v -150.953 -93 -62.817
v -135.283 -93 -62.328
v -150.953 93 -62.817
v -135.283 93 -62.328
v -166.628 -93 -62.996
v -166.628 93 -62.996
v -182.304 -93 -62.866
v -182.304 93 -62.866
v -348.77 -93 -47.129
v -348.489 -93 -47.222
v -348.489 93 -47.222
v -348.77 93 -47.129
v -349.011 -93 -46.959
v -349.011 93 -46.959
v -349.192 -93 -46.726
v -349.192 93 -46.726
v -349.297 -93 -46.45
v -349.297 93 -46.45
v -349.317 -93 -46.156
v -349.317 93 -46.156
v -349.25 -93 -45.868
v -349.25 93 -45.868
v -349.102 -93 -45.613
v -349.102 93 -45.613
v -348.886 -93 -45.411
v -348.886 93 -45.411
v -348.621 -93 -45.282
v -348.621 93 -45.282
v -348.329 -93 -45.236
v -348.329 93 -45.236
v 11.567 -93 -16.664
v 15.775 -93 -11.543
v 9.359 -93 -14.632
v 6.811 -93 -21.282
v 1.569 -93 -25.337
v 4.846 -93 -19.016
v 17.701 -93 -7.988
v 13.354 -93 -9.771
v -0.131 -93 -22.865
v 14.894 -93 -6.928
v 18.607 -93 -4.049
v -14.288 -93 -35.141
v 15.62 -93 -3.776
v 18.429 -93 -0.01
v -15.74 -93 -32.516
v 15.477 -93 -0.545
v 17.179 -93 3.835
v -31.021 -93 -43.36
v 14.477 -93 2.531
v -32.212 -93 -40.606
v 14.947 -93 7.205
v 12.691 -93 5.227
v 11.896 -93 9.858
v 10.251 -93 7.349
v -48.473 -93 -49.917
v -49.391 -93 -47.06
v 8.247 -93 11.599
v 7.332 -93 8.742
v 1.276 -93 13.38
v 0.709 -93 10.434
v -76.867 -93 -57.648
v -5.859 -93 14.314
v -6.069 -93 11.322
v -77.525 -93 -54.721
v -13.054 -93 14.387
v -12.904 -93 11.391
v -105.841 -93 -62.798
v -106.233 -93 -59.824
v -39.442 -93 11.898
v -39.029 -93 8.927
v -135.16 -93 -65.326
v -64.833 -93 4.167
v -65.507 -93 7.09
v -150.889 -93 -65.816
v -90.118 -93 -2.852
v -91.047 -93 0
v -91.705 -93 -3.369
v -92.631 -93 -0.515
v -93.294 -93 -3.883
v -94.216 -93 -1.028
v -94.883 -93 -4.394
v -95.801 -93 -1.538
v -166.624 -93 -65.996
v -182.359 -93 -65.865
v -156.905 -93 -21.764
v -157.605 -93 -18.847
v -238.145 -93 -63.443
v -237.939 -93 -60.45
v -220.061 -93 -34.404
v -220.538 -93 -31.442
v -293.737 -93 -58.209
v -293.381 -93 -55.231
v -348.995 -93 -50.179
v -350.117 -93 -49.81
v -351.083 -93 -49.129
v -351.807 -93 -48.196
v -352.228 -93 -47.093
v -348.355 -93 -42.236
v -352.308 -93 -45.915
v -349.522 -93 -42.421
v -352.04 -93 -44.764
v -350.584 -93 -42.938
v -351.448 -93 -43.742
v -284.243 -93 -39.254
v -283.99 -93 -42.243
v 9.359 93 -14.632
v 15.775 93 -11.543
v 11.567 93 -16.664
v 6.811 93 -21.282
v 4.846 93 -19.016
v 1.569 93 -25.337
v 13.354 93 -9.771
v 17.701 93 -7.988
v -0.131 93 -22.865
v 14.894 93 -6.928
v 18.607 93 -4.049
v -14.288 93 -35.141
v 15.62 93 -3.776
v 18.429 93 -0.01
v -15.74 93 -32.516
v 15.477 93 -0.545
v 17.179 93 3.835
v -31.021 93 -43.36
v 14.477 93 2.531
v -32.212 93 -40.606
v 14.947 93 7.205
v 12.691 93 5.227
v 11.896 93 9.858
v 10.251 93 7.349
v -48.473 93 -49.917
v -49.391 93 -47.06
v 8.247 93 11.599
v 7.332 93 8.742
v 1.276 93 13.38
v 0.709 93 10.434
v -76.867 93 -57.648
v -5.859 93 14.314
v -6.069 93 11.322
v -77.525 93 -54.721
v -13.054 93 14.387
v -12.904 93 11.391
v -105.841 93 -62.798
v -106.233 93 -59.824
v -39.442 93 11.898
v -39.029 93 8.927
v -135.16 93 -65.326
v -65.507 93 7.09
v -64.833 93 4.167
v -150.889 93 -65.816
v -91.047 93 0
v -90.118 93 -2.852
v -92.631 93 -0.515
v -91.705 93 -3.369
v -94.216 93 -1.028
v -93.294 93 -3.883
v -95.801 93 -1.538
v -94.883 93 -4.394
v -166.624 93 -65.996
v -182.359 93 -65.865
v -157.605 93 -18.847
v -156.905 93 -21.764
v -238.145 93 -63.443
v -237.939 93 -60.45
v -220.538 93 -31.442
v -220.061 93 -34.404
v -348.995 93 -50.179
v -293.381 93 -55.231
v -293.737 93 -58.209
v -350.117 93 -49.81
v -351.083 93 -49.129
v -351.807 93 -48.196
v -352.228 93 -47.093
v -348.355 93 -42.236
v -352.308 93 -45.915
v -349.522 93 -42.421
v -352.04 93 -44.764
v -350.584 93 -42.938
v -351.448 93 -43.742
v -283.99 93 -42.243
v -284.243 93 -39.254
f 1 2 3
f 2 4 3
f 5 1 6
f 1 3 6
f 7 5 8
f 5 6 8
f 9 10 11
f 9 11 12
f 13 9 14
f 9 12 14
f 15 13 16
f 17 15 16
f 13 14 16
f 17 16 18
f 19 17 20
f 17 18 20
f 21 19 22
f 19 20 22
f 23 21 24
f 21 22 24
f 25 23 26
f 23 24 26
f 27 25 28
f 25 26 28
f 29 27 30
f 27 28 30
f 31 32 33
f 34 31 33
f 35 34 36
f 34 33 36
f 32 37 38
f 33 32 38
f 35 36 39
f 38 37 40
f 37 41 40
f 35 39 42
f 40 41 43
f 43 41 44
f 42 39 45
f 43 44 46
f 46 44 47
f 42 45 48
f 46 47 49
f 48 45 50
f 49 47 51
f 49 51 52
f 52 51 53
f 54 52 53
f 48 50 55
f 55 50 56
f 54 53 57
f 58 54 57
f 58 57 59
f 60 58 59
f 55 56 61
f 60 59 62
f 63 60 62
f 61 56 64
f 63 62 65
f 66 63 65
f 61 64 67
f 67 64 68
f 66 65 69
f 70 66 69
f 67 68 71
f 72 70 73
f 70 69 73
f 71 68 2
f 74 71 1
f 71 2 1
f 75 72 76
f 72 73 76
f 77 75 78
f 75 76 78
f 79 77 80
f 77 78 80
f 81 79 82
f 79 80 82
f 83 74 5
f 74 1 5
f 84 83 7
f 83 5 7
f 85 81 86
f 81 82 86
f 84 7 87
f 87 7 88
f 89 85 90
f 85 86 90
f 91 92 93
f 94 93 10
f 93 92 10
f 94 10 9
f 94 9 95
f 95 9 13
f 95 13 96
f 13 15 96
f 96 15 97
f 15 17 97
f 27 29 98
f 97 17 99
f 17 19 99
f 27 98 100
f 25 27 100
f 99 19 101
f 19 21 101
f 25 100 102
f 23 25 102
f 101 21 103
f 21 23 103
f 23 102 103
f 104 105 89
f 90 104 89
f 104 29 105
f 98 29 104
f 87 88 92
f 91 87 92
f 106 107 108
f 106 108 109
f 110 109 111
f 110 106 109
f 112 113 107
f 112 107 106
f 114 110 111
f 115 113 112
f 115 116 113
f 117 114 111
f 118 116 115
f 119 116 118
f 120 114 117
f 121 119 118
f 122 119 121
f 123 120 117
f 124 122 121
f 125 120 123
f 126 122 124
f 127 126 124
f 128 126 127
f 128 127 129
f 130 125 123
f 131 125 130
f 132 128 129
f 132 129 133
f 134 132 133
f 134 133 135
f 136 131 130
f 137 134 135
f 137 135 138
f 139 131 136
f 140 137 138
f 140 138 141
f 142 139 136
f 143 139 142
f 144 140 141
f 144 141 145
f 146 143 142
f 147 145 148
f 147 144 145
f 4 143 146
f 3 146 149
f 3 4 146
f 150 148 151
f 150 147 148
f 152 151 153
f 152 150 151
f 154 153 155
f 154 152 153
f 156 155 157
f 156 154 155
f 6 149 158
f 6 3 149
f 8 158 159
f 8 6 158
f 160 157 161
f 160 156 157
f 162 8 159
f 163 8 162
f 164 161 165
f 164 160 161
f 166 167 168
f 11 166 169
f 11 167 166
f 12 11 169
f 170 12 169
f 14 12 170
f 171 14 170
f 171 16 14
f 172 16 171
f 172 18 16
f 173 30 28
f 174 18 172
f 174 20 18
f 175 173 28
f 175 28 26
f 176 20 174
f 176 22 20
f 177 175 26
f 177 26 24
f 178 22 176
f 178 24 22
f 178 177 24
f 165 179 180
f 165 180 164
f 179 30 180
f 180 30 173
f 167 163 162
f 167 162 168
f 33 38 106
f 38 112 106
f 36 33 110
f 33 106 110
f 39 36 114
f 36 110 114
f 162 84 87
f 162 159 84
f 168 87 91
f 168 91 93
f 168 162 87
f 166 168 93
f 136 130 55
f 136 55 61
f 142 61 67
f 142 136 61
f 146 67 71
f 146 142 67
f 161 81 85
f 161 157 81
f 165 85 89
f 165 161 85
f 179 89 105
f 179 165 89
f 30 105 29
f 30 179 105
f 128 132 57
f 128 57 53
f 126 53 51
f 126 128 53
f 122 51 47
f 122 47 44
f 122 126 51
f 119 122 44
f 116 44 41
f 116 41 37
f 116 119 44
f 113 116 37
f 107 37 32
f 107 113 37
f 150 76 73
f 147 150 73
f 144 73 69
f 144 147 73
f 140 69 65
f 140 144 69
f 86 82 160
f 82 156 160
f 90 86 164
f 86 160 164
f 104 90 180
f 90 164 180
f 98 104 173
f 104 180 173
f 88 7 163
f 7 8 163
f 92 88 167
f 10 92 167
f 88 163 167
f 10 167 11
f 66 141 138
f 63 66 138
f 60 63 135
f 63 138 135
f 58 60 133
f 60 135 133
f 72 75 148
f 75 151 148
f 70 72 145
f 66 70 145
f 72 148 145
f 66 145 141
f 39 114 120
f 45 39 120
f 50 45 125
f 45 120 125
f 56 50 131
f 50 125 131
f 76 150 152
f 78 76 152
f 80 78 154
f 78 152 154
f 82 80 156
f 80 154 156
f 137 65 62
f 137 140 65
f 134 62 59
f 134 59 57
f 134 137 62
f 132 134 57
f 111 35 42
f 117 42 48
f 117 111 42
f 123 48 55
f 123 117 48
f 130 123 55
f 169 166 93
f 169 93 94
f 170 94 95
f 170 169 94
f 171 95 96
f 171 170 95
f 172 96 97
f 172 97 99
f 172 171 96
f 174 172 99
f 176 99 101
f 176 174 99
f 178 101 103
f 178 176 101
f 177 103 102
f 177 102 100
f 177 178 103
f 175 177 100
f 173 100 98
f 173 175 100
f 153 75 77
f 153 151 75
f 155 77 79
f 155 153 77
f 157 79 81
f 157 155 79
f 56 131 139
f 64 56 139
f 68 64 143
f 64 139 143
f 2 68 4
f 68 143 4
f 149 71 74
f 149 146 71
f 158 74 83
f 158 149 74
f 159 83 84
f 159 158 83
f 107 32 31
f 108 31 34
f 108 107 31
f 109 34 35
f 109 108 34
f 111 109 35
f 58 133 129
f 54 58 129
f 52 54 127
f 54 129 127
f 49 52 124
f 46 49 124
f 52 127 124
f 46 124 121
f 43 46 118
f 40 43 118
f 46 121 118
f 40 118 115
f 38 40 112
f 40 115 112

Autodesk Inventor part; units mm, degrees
ref_plane "YZ Plane" through (0, 0, 0) normal (1, 0, 0) x (0, 1, 0)
ref_plane "XZ Plane" through (0, 0, 0) normal (0, 1, 0) x (-1, 0, 0)
ref_plane "XY Plane" through (0, 0, 0) normal (0, 0, 1) x (1, 0, 0)
sketch "スケッチ1" plane through (0, 0, 0) normal (0, 1, 0) x (-1, 0, 0)
  arc A0 (182.3045, -62.8657) -> (348.4892, -47.2216) centre (162.2533, 1040.6287) ccw projected
  arc A1 (135.2834, -62.3282) -> (182.3045, -62.8657) centre (167.871, 731.467) ccw projected
  arc A2 (49.3906, -47.0603) -> (135.2834, -62.3282) centre (148.588, 261.756) ccw projected
  arc A3 (0.1309, -22.8654) -> (49.3906, -47.0603) centre (107.173, 132.825) ccw projected
  arc A4 (-13.3538, -9.7713) -> (0.1309, -22.8654) centre (31.9, 23.342) ccw projected
  arc A5 (-7.3318, 8.7424) -> (-13.3538, -9.7713) centre (-3.6695, -2.6851) ccw projected
  arc A6 (12.9042, 11.391) -> (-7.3318, 8.7424) centre (10.0641, -45.5382) ccw projected
  arc A7 (90.1175, -2.8524) -> (12.9042, 11.391) centre (-1.8944, -285.2401) ccw projected
  arc A8 (90.1175, -2.8524) -> (94.8834, -4.3943) centre (462.8125, 1140.9603) ccw projected
  arc A9 (94.8834, -4.3943) -> (348.3291, -45.236) centre (355.7675, 807.7316) ccw projected
  arc A10 (348.4892, -47.2216) -> (348.3291, -45.236) centre (348.3204, -46.2359) ccw projected
  circle A11 centre (29.3651, -6.1392) radius 6 projected
  circle A12 centre (239.8151, -50.1371) radius 6 projected
  point P0 (0, 0)
extrude "押し出し1" add sketch "スケッチ1" along normal mid plane 186 contours A1 A2 A3 A4 A5 A6 A7 A8 A9 A10 A0 | A11 | A12
shell "シェル1" thickness 3 outward yes removed faces 2 at (-105.6232, 93, -25.6277) at (-105.6232, -93, -25.6277)
properties part number "GFRP_main"
